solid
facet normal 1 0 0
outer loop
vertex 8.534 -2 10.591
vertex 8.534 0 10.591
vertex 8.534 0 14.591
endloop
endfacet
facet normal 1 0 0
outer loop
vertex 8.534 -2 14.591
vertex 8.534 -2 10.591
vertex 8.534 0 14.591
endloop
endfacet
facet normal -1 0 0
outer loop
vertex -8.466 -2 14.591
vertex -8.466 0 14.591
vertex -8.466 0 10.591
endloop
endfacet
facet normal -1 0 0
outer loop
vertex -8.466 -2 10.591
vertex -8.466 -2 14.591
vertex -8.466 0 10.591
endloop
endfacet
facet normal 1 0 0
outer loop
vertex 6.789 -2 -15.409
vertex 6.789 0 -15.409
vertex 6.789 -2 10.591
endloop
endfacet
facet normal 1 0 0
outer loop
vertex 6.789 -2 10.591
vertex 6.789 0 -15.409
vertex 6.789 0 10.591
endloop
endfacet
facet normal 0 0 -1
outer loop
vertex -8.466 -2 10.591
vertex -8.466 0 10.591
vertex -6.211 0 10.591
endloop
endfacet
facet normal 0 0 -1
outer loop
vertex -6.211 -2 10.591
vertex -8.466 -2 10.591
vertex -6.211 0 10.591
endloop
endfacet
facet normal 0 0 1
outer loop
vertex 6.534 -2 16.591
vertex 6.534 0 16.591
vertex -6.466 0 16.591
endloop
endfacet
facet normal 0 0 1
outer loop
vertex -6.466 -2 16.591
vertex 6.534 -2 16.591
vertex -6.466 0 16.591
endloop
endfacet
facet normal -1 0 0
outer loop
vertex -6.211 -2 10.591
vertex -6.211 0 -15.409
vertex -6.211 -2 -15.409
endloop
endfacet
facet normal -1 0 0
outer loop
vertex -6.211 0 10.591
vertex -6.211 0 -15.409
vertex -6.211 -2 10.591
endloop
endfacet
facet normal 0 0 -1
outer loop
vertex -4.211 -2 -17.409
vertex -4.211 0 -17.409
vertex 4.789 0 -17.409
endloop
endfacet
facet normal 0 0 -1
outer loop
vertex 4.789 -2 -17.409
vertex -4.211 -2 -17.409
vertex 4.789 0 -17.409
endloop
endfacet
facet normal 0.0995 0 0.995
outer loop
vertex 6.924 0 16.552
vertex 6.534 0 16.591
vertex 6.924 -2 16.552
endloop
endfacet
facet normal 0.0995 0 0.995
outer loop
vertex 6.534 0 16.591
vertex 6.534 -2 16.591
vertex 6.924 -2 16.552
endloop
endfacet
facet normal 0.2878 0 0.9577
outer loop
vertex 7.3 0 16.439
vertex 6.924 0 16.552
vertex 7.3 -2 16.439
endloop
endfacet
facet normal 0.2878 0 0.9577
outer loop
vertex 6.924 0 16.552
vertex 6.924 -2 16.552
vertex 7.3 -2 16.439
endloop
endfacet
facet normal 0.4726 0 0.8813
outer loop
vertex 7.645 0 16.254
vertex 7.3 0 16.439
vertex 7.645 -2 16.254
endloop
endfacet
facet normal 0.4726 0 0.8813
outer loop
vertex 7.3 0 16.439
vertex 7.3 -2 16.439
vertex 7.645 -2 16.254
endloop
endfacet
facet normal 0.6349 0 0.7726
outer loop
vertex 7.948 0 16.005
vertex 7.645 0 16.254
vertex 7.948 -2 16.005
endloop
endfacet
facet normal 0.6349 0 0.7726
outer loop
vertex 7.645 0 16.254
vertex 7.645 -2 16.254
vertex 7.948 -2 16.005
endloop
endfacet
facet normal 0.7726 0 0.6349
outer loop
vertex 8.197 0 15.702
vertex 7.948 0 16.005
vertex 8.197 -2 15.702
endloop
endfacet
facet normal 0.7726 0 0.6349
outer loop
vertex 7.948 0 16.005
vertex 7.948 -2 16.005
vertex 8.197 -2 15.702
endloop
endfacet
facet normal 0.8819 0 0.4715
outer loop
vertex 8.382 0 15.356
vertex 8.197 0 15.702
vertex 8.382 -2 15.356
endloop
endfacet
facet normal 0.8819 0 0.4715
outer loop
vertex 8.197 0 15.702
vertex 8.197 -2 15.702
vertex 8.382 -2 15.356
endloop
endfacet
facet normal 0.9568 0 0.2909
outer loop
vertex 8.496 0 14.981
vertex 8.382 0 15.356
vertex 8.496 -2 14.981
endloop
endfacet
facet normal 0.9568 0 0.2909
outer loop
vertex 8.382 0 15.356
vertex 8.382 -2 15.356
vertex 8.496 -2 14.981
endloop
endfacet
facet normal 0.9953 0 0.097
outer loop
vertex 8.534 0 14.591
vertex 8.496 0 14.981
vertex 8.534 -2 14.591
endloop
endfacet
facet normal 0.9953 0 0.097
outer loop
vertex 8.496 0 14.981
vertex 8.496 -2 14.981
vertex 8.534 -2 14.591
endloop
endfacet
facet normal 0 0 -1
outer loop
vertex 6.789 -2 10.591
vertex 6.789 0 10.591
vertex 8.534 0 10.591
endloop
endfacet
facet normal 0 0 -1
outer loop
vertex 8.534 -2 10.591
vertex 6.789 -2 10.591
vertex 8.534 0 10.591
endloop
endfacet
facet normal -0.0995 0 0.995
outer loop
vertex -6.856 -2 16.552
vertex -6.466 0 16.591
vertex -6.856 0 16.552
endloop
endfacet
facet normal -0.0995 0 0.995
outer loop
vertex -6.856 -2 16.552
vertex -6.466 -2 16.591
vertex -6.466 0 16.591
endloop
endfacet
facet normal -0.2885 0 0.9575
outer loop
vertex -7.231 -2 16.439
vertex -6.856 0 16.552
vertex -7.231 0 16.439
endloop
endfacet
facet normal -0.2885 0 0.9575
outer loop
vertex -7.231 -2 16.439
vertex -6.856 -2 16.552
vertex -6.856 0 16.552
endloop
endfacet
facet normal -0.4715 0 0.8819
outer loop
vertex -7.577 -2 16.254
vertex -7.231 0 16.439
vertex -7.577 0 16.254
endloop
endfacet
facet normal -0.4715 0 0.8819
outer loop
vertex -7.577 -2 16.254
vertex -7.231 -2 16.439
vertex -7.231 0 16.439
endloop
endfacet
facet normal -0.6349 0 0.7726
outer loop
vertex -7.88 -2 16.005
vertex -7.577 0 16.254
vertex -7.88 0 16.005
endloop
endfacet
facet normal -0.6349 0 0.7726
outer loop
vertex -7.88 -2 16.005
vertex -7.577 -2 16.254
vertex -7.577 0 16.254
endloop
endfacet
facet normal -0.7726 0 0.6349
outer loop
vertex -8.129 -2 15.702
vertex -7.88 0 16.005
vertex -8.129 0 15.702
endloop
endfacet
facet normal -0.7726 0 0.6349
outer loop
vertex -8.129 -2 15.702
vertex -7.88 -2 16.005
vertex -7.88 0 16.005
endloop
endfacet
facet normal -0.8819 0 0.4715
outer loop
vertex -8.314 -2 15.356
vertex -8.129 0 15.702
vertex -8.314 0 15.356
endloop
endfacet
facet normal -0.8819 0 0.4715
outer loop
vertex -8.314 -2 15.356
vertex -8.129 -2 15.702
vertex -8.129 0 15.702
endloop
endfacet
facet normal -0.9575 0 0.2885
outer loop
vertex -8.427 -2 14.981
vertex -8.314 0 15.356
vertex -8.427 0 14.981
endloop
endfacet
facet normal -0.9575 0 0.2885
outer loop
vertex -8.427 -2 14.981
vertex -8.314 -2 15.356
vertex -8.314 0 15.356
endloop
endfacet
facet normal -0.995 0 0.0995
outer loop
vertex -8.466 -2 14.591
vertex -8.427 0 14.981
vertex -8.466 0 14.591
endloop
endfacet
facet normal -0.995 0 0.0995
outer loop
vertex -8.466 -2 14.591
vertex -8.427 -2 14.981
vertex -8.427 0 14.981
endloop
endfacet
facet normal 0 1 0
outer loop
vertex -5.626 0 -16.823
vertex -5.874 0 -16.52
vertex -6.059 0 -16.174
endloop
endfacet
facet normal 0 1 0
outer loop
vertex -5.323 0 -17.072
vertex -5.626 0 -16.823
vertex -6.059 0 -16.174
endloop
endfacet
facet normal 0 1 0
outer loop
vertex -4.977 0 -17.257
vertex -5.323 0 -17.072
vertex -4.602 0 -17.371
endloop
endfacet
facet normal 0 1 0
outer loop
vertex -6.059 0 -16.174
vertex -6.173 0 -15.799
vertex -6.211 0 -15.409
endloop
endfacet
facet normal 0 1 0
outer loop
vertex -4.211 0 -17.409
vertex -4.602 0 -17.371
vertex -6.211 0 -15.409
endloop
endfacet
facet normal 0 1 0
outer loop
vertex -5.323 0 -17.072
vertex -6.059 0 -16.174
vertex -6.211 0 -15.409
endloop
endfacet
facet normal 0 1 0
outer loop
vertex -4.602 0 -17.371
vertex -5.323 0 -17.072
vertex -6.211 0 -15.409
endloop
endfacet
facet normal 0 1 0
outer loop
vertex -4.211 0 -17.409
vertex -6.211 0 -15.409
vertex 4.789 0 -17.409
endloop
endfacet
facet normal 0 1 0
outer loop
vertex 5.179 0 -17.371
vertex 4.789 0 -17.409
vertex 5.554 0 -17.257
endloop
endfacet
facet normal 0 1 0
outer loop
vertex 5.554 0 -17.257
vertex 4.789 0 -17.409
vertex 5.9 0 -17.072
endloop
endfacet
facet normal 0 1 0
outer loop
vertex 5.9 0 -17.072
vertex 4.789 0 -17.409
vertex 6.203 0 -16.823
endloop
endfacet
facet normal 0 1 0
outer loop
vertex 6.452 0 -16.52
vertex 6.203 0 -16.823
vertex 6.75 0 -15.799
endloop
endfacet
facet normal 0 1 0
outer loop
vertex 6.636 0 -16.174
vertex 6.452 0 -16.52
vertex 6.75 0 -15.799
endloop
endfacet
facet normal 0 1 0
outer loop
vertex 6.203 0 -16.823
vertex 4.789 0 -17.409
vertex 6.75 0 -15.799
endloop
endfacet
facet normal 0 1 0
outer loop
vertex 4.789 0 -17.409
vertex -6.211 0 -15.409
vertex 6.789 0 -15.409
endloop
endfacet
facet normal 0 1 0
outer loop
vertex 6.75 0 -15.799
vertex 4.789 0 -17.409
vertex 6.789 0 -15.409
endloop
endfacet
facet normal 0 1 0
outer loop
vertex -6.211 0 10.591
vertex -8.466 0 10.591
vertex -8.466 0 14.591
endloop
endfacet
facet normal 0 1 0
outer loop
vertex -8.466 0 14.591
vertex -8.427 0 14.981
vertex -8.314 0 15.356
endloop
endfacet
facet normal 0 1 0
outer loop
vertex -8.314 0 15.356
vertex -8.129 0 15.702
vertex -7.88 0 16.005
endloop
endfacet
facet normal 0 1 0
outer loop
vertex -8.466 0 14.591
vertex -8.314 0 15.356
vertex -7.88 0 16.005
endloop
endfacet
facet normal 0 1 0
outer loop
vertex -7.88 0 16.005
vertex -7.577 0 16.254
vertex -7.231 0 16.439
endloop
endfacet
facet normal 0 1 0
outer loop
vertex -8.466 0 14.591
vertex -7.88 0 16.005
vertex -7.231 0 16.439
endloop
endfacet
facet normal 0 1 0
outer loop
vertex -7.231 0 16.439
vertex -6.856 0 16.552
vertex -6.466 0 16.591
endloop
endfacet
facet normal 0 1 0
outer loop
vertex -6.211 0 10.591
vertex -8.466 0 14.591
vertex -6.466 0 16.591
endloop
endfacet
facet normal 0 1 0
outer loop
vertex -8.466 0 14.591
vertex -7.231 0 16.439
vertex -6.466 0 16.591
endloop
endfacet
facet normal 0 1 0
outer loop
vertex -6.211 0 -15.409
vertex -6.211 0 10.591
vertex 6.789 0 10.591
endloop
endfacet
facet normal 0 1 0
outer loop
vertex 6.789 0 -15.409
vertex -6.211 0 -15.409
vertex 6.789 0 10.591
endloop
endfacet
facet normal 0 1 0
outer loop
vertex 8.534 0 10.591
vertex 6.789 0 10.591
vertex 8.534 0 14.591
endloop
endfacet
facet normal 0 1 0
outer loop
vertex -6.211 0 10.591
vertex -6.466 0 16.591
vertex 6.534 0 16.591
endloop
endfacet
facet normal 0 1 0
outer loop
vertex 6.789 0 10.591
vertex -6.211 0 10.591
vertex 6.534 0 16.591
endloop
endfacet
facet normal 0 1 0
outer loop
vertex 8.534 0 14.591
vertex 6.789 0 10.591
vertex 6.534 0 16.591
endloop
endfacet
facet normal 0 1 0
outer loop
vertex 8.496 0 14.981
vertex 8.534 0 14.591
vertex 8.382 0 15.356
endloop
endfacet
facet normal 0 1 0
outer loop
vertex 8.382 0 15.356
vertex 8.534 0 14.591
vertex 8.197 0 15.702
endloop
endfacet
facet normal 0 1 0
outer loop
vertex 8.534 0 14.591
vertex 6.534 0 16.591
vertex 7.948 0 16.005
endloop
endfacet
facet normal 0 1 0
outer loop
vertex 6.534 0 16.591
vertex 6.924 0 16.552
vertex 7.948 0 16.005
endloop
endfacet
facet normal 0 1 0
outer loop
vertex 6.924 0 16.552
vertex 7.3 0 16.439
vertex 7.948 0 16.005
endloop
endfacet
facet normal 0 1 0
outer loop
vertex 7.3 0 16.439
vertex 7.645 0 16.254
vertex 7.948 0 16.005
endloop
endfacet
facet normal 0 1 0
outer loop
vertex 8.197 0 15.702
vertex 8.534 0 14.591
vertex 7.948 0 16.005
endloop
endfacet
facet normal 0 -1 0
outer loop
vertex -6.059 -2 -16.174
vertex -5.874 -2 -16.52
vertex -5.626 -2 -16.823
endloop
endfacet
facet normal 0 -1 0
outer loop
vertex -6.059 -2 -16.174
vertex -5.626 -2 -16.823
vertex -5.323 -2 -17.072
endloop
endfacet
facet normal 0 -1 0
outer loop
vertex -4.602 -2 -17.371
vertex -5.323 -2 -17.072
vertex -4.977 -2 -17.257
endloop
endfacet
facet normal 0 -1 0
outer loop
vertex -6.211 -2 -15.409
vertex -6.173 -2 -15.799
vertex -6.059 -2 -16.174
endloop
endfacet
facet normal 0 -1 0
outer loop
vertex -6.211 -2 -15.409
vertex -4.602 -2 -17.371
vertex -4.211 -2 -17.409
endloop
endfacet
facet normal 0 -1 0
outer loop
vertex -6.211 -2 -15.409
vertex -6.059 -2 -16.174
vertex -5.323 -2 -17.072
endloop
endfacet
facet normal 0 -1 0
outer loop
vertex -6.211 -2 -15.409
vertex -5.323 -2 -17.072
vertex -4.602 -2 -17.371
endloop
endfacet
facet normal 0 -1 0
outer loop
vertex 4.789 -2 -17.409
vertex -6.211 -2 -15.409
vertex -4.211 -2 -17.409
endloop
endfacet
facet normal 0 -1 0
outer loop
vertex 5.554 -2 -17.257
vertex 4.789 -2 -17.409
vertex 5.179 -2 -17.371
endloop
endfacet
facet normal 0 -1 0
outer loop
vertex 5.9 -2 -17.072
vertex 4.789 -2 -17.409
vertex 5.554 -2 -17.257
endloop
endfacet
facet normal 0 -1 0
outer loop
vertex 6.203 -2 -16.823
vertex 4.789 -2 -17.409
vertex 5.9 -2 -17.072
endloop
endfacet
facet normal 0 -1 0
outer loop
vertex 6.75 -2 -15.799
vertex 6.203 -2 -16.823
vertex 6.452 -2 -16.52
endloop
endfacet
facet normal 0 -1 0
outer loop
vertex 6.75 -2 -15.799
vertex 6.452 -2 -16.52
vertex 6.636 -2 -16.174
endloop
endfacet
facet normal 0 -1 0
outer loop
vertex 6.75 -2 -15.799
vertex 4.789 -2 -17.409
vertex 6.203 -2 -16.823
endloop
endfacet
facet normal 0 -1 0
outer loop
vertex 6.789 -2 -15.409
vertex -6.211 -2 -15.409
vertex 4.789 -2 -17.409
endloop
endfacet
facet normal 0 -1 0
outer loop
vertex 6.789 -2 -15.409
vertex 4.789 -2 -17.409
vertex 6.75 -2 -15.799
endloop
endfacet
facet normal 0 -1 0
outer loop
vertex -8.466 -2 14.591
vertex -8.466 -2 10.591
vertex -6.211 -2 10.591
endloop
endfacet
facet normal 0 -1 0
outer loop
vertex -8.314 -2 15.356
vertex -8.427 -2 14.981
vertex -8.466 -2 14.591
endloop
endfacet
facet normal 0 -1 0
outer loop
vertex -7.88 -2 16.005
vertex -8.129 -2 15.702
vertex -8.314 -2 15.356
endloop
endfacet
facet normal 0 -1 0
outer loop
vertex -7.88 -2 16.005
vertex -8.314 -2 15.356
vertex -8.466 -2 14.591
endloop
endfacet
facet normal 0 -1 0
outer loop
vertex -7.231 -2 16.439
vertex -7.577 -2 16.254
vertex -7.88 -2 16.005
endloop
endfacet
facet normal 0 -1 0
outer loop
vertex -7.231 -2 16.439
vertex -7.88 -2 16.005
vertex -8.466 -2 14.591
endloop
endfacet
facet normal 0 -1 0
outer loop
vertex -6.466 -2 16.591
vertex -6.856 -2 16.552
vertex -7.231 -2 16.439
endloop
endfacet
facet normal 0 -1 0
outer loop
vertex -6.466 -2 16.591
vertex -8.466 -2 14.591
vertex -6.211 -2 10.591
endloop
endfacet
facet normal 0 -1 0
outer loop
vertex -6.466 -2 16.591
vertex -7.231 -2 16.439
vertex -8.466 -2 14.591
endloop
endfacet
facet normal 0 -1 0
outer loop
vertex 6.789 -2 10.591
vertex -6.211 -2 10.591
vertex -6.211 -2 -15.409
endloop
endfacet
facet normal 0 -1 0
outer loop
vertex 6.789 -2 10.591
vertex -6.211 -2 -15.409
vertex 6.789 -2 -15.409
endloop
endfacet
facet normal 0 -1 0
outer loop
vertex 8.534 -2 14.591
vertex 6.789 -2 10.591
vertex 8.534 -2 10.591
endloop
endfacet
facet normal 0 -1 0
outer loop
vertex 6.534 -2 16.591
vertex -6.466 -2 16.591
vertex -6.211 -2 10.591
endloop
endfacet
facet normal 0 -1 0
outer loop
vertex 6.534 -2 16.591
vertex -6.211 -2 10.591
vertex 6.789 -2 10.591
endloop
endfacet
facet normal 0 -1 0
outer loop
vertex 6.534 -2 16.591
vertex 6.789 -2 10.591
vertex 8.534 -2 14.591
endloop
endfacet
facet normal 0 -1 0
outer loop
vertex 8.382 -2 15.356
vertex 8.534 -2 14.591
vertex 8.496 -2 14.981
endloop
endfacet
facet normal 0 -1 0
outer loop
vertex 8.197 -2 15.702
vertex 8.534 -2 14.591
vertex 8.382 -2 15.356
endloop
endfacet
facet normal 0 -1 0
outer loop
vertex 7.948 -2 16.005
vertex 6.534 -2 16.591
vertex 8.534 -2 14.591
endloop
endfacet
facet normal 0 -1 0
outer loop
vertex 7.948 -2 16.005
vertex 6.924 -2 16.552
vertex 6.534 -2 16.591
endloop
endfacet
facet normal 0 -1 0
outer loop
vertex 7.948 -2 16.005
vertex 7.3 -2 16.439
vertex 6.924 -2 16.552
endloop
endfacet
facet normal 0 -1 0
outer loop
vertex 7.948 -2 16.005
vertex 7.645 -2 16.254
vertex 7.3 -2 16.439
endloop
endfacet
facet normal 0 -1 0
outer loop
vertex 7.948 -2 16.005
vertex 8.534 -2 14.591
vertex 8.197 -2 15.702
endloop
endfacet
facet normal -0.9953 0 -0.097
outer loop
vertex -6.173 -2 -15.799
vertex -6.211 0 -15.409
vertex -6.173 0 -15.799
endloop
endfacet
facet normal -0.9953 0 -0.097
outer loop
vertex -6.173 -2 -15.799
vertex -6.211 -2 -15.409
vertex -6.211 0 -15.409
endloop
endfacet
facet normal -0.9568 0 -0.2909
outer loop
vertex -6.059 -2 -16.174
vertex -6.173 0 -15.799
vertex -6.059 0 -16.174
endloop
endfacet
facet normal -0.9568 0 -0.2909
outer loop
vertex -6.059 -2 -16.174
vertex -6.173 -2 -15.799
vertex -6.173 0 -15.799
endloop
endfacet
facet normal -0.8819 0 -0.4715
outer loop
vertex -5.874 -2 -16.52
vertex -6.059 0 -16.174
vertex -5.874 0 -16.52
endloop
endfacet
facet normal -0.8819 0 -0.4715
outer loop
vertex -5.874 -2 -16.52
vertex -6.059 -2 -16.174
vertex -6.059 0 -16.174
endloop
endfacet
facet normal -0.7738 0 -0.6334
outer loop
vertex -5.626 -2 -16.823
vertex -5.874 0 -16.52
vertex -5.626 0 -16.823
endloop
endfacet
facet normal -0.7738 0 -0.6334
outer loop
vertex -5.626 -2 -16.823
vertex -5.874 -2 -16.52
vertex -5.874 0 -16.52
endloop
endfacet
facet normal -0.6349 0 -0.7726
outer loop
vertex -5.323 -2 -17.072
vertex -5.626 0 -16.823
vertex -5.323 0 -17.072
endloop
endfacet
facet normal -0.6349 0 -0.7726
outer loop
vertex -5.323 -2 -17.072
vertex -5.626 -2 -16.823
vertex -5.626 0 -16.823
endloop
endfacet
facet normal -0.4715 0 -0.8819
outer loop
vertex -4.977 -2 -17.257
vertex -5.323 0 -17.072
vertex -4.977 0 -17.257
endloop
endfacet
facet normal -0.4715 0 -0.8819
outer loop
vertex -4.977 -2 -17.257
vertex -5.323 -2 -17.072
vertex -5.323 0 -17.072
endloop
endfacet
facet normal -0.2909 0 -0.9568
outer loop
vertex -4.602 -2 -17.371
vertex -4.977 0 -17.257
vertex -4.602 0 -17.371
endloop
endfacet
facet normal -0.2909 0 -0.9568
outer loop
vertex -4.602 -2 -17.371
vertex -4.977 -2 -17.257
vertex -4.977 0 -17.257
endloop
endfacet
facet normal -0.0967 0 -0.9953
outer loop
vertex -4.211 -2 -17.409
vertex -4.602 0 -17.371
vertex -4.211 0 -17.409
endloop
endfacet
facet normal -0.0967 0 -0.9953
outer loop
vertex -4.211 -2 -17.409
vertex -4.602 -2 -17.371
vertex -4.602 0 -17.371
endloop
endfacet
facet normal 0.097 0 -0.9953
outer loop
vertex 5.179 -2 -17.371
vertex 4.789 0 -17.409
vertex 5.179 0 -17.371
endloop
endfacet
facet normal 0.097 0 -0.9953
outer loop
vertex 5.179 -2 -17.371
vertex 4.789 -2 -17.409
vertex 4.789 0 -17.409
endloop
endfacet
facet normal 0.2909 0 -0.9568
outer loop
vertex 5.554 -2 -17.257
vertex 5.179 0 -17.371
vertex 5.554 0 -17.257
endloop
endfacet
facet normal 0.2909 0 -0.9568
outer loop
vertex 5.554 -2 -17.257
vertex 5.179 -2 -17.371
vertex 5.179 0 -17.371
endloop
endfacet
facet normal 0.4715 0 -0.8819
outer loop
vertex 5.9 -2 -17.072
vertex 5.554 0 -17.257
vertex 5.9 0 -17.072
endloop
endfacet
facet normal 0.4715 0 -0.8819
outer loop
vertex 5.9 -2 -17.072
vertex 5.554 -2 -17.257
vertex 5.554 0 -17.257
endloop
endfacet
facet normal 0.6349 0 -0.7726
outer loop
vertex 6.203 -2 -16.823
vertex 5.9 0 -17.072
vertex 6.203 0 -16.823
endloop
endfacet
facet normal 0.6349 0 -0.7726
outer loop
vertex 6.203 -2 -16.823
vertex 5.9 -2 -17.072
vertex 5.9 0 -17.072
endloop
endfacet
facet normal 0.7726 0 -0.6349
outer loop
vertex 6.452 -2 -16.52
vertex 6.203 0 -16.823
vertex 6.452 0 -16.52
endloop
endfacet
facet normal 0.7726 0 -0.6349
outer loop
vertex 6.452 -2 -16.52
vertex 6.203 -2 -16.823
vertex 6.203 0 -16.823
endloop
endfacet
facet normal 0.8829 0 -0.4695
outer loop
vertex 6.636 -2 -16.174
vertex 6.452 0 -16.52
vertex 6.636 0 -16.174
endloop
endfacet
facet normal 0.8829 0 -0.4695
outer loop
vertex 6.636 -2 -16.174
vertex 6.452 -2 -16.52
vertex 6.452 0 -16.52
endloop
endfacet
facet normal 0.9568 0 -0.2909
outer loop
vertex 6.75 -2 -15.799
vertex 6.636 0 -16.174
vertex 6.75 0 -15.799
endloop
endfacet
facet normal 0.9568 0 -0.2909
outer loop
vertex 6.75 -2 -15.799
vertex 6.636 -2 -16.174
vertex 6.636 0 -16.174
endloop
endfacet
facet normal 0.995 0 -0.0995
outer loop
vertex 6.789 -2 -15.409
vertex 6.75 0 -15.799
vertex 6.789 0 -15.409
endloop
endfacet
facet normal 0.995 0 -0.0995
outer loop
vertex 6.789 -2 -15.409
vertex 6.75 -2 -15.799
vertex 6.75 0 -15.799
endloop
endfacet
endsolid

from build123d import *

# Parameters (mm, degrees)
F0_W     = 13
F0_H     = 28
F1_DEPTH = 2
F2_R     = 2
F3_R     = 2


with BuildPart() as f1:
    # F0 (on Front) → F1 (new body)
    with BuildSketch(Plane.XZ):
        Polygon((-8.465854, 10.590909), (-6.211373, 10.590909), (6.788627, 10.590909), (8.534146, 10.590909), (8.534146, 16.590909), (-8.465854, 16.590909), align=None)
        with Locations((0.288627, -3.409091)):
            Rectangle(F0_W, F0_H)
    extrude(amount=F1_DEPTH)

    # F2
    f2_edges = [f1.edges().sort_by_distance(p)[0] for p in [
        (-8.465854, -1, 16.590909),
        (-6.211373, -1, -17.409091),
    ]]
    fillet(f2_edges, radius=F2_R)

    # F3
    f3_edges = [f1.edges().sort_by_distance(p)[0] for p in [
        (8.534146, -1, 16.590909),
        (6.788627, -1, -17.409091),
    ]]
    fillet(f3_edges, radius=F3_R)


solid = f1.part
